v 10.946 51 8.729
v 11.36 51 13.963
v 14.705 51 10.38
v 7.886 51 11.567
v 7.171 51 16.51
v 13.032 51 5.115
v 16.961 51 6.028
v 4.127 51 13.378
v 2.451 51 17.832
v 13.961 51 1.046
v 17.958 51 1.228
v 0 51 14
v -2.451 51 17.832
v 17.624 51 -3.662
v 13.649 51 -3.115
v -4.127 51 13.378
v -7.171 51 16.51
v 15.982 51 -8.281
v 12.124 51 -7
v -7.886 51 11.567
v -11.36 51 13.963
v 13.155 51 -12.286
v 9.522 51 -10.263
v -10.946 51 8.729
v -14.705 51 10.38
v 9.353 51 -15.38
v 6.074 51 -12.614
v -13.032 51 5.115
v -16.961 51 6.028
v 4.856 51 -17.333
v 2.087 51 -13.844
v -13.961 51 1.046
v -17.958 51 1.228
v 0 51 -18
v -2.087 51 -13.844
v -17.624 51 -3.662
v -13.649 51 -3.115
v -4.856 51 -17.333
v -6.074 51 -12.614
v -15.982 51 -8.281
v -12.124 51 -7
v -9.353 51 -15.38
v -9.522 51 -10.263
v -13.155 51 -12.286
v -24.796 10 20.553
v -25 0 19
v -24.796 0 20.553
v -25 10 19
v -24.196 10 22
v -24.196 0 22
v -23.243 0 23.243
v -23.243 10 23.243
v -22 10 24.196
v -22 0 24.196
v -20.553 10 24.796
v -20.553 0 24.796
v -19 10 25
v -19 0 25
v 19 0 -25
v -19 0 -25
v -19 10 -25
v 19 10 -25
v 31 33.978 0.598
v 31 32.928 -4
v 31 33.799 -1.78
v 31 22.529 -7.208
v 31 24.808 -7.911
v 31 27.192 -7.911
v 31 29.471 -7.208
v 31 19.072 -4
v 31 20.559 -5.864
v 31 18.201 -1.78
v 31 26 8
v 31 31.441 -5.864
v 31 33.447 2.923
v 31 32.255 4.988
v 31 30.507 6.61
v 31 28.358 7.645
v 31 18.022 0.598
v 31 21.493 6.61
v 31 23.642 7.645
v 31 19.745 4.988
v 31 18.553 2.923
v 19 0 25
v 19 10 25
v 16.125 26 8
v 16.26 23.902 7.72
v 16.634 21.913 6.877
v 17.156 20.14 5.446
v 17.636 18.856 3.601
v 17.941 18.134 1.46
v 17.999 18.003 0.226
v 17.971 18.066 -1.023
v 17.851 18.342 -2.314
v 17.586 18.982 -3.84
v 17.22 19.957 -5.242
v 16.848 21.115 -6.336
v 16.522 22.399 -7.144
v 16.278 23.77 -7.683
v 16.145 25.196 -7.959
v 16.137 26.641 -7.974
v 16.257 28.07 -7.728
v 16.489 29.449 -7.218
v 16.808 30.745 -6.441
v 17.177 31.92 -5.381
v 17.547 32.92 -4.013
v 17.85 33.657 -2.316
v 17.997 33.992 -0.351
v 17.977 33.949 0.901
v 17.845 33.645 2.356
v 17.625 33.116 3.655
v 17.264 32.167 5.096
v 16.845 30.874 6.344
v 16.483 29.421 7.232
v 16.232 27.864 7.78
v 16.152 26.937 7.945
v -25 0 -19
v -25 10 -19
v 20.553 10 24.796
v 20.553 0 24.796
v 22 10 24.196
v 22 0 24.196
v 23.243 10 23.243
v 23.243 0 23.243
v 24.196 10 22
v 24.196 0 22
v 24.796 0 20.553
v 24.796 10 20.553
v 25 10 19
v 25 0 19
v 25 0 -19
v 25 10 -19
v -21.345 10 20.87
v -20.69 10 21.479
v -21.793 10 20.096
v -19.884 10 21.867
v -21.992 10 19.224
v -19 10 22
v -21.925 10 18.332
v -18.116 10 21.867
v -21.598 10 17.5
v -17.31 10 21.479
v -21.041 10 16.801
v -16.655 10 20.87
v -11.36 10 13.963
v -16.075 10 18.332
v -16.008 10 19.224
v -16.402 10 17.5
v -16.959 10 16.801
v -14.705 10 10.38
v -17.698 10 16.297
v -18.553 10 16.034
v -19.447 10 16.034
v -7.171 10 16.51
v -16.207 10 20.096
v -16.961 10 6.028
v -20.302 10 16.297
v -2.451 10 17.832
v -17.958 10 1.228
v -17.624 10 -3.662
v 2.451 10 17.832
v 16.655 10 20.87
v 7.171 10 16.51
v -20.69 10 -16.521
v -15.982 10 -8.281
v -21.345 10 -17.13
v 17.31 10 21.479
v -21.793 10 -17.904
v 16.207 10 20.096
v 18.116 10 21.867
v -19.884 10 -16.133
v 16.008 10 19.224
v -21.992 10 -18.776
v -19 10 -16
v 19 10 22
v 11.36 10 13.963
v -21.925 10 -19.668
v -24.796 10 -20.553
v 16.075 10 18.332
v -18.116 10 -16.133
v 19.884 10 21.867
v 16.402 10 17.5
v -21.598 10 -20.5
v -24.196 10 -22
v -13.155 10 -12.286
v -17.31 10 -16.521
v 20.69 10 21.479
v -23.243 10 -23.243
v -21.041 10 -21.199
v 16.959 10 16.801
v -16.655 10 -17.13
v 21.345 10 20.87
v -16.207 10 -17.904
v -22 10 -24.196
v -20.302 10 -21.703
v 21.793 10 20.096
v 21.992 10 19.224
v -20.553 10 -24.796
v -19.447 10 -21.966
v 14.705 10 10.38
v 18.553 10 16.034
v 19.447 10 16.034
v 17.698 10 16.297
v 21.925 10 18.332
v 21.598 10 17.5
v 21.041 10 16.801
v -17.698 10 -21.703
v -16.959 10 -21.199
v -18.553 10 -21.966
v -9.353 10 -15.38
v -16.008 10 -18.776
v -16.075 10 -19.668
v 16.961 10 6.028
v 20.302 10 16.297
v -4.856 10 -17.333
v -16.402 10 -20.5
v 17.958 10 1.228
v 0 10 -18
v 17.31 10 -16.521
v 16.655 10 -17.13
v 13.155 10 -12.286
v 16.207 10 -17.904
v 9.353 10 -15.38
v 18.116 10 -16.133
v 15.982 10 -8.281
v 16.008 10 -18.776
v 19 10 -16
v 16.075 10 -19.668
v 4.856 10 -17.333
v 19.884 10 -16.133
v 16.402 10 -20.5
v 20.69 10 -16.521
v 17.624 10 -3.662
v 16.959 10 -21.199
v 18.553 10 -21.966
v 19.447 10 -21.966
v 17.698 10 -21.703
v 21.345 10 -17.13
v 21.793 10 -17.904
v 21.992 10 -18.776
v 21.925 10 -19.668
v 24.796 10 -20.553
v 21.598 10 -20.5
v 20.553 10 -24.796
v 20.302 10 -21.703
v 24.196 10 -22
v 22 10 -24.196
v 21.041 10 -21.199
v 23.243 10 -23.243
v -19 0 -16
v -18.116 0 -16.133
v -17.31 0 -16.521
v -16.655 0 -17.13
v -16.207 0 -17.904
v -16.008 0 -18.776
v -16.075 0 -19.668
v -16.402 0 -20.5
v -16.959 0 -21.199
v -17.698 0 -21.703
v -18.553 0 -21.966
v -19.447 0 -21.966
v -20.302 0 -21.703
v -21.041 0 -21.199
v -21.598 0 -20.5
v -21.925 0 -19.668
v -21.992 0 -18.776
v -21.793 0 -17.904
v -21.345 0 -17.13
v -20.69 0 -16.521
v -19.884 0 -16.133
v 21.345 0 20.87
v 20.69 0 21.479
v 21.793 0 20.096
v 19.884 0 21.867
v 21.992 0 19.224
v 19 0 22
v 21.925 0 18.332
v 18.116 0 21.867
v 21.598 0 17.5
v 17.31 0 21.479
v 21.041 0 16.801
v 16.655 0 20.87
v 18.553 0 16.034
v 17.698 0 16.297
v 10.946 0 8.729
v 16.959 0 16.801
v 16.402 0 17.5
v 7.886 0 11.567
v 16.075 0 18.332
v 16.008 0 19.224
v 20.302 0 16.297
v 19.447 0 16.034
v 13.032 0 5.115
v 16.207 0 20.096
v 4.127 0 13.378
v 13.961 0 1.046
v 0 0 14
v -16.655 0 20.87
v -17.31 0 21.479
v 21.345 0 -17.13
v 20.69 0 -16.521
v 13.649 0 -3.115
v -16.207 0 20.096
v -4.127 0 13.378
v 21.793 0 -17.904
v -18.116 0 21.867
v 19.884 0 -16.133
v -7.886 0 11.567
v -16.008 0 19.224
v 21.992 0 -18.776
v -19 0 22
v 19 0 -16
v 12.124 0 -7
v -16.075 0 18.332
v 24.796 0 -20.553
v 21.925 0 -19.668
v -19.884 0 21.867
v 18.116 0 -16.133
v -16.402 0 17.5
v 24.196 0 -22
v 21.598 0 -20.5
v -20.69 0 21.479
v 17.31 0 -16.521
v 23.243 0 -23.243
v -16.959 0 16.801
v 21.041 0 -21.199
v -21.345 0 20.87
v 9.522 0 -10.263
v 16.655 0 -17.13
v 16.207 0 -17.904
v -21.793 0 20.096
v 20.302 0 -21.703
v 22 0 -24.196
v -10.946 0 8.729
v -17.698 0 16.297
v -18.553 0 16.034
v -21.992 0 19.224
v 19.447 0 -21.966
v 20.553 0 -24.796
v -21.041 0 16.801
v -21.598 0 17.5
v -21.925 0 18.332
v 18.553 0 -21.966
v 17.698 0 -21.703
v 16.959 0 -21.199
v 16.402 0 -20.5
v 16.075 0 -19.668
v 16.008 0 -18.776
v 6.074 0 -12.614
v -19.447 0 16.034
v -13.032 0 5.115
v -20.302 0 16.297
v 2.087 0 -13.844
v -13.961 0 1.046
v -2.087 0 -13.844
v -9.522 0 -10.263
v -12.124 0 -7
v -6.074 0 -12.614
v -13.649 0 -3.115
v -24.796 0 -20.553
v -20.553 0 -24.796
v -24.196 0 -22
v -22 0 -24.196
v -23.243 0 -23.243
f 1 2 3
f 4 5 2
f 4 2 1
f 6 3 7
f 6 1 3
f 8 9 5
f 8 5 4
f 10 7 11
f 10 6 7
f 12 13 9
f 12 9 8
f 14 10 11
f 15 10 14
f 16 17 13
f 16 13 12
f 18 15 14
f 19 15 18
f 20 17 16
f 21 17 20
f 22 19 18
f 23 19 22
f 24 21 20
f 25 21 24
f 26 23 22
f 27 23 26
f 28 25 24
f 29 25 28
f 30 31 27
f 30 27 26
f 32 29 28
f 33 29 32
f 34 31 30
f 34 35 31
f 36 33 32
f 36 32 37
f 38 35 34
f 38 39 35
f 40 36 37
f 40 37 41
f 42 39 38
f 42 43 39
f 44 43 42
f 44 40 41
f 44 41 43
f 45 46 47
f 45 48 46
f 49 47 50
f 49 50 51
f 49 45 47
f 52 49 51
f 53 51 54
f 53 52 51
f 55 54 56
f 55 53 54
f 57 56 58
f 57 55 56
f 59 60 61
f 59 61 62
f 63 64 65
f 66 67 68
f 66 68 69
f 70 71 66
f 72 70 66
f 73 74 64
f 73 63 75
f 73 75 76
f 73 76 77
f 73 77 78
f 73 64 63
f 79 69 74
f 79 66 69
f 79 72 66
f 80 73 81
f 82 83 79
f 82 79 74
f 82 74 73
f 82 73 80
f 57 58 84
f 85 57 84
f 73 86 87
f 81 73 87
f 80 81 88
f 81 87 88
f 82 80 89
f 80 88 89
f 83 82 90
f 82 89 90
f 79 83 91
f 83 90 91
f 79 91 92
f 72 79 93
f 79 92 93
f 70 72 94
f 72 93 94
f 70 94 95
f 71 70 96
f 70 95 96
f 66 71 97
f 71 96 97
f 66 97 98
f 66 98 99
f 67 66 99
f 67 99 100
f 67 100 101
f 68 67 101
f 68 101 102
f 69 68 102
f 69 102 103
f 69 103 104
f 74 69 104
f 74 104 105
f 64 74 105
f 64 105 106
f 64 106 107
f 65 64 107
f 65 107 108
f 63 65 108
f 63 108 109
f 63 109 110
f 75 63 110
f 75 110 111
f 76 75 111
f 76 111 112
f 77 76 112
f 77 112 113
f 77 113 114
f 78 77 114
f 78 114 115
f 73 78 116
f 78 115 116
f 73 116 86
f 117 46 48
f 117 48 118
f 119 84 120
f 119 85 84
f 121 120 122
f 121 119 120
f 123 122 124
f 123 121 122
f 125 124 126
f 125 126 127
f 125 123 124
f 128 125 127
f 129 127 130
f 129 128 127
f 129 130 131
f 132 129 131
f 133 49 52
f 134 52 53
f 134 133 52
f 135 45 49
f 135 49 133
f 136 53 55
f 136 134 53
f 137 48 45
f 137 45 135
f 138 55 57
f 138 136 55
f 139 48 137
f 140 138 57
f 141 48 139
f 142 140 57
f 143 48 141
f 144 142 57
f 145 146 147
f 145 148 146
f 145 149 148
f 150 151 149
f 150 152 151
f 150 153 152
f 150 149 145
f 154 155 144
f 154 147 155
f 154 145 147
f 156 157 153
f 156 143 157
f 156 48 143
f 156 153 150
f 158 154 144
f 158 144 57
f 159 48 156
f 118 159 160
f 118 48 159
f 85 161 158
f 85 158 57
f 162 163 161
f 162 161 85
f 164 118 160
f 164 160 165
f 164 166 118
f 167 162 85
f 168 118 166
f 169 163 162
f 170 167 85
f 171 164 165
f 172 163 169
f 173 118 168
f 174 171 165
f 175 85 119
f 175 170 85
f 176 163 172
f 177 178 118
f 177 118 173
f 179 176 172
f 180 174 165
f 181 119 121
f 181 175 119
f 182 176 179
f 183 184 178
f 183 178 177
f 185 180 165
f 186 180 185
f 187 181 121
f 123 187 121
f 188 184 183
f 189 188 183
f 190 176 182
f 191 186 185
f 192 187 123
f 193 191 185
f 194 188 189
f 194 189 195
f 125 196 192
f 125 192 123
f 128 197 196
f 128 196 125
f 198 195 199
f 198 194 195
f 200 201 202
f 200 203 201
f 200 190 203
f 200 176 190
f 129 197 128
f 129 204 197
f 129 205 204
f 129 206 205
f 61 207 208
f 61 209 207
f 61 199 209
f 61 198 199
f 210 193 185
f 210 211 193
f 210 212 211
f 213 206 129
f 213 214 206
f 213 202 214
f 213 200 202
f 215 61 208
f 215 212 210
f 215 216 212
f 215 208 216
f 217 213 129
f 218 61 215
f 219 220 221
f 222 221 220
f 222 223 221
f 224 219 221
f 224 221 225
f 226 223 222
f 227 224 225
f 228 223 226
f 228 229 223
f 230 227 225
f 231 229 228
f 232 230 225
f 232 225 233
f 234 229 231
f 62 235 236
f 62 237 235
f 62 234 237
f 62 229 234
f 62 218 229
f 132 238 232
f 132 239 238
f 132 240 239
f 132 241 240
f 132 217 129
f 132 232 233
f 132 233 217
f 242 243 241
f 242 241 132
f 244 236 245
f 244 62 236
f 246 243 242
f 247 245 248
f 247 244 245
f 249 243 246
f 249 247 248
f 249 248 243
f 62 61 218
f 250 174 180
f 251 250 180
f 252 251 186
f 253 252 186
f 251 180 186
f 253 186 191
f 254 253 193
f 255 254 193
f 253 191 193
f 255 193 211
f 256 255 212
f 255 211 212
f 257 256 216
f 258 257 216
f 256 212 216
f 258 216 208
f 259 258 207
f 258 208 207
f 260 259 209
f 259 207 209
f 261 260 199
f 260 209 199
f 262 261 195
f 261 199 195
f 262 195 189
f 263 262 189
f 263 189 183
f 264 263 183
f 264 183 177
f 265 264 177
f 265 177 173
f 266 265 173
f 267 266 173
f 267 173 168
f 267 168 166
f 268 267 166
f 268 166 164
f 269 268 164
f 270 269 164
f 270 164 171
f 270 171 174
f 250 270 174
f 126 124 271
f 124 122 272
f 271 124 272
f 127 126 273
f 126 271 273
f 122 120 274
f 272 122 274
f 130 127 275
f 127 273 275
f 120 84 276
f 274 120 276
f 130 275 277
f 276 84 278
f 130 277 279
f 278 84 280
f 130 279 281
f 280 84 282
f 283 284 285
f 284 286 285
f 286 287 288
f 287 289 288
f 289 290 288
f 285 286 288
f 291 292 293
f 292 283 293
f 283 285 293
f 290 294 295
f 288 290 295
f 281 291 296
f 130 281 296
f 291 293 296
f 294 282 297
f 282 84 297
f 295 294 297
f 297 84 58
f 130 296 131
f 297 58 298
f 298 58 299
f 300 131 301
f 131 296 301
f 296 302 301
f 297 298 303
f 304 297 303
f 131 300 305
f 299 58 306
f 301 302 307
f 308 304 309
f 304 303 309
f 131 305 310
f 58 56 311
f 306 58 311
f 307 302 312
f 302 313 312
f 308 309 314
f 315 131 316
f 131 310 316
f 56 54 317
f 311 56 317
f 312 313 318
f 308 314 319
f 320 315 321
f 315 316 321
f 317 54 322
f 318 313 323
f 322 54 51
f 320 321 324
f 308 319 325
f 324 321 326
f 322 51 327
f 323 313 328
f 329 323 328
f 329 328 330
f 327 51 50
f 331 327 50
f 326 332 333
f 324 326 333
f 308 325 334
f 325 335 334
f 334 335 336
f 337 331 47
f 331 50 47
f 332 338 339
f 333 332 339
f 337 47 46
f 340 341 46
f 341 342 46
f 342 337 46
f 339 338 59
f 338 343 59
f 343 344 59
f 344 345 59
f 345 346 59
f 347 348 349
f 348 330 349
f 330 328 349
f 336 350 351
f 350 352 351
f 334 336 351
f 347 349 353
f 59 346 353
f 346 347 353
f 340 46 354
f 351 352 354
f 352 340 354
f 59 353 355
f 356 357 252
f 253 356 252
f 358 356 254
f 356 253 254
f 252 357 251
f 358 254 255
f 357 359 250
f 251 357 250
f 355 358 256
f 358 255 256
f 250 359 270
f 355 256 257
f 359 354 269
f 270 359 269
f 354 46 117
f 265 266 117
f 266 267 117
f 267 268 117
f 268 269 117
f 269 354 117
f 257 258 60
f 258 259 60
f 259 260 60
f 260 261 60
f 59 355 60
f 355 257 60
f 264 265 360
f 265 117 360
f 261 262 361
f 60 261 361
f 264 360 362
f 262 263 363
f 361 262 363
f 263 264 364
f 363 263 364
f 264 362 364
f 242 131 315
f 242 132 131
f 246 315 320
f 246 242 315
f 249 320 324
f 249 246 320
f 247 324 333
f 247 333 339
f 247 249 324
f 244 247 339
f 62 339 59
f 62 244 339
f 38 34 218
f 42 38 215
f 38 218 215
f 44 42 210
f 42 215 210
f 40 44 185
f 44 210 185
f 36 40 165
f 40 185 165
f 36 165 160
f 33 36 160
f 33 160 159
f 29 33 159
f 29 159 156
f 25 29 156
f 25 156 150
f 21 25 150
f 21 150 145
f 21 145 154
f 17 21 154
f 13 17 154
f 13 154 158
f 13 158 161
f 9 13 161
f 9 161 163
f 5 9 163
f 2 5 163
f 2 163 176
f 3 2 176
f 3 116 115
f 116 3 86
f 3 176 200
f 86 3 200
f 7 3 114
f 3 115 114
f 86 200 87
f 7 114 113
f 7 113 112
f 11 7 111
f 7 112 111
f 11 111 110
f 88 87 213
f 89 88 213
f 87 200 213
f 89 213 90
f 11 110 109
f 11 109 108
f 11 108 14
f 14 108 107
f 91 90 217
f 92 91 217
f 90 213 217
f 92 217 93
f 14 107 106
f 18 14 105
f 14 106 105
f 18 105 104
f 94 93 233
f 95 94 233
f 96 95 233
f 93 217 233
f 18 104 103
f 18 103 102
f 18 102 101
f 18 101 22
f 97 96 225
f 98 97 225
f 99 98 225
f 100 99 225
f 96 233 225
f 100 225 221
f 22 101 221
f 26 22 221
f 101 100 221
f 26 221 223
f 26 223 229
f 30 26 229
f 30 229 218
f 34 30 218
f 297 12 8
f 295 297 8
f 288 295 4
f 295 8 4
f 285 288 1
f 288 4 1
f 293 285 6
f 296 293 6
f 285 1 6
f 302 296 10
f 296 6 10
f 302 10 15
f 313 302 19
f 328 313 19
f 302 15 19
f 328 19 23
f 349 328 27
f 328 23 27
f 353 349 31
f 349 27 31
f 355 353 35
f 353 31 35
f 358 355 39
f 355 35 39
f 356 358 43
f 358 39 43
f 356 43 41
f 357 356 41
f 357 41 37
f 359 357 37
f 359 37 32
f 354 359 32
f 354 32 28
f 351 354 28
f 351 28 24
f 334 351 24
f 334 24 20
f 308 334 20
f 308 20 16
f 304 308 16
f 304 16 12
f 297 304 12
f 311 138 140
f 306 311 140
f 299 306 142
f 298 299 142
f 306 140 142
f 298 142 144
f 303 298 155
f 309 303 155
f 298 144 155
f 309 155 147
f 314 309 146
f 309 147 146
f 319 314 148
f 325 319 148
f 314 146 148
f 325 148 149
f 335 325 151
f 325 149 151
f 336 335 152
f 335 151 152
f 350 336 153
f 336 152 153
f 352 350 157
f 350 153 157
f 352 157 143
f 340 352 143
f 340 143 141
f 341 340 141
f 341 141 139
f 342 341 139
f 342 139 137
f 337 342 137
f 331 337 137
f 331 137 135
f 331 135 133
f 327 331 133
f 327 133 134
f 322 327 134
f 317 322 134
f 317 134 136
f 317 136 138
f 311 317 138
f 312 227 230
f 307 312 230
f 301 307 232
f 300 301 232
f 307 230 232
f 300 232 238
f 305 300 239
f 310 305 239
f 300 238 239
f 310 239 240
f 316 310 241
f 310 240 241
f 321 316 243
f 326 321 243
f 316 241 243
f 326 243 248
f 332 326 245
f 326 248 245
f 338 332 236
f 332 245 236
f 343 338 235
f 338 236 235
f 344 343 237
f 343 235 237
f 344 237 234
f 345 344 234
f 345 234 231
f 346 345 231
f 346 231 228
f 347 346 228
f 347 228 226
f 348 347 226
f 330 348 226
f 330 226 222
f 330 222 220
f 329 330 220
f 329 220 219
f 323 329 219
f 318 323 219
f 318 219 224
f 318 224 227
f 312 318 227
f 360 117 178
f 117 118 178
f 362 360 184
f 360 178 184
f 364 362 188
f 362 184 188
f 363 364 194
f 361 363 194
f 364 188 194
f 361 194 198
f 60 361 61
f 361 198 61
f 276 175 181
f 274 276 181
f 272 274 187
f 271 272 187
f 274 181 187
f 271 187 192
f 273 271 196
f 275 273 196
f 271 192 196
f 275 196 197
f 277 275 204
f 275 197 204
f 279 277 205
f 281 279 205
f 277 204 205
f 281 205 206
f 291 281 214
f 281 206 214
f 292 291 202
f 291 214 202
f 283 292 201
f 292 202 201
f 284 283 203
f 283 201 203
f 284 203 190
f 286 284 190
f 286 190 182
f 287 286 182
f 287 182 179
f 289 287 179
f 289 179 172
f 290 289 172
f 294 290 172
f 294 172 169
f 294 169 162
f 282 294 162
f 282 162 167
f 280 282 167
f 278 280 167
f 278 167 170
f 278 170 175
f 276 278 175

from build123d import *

# Parameters (mm, degrees)
SKETCH_3_W           = 50
SKETCH_3_H           = 50
EXTRUDE_1_DEPTH      = 10
FILLET_7_R           = 6
FILLET_8_R           = 6
FILLET_9_R           = 6
FILLET_10_R          = 6
SKETCH_4_R           = 3
CUT_EXTRUDE_1_DEPTH  = 37.742346142
SKETCH_6_R           = 3
CUT_EXTRUDE_14_DEPTH = 37.742346142
SKETCH_7_R           = 3
CUT_EXTRUDE_15_DEPTH = 37.742346142
SKETCH_8_R           = 3
CUT_EXTRUDE_16_DEPTH = 37.742346142
SKETCH_9_R           = 18
EXTRUDE_4_DEPTH      = 51
SKETCH_12_R          = 8
EXTRUDE_5_DEPTH      = 31
SKETCH_10_R          = 14
CUT_EXTRUDE_17_DEPTH = 65.707032123


with BuildPart() as part:
    # 草图3 → 凸台-拉伸1 (new body)
    with BuildSketch(Plane(origin=(0, 0, 0), x_dir=(1, 0, 0), z_dir=(0, 1, 0))):
        Rectangle(SKETCH_3_W, SKETCH_3_H)
    extrude(amount=EXTRUDE_1_DEPTH)

    # 圆角7
    fillet_7_edges = [part.edges().sort_by_distance(p)[0] for p in [
        (-25, 5, -25),
    ]]
    fillet(fillet_7_edges, radius=FILLET_7_R)

    # 圆角8
    fillet_8_edges = [part.edges().sort_by_distance(p)[0] for p in [
        (-25, 5, 25),
    ]]
    fillet(fillet_8_edges, radius=FILLET_8_R)

    # 圆角9
    fillet_9_edges = [part.edges().sort_by_distance(p)[0] for p in [
        (25, 5, 25),
    ]]
    fillet(fillet_9_edges, radius=FILLET_9_R)

    # 圆角10
    fillet_10_edges = [part.edges().sort_by_distance(p)[0] for p in [
        (25, 5, -25),
    ]]
    fillet(fillet_10_edges, radius=FILLET_10_R)

    # 草图4 → 切除-拉伸1 (cut, through all)
    with BuildSketch(Plane(origin=(0, 10, 0), x_dir=(1, 0, 0), z_dir=(0, 1, 0))):
        with Locations(Location((-19, -19, 0), (0, 0, 270))):
            Circle(SKETCH_4_R)
    extrude(amount=-CUT_EXTRUDE_1_DEPTH, mode=Mode.SUBTRACT)

    # 草图6 → 切除-拉伸14 (cut, through all)
    with BuildSketch(Plane(origin=(0, 10, 0), x_dir=(1, 0, 0), z_dir=(0, 1, 0))):
        with Locations(Location((-19, 19, 0), (0, 0, 270))):
            Circle(SKETCH_6_R)
    extrude(amount=-CUT_EXTRUDE_14_DEPTH, mode=Mode.SUBTRACT)

    # 草图7 → 切除-拉伸15 (cut, through all)
    with BuildSketch(Plane(origin=(0, 10, 0), x_dir=(1, 0, 0), z_dir=(0, 1, 0))):
        with Locations(Location((19, 19, 0), (0, 0, 270))):
            Circle(SKETCH_7_R)
    extrude(amount=-CUT_EXTRUDE_15_DEPTH, mode=Mode.SUBTRACT)

    # 草图8 → 切除-拉伸16 (cut, through all)
    with BuildSketch(Plane(origin=(0, 10, 0), x_dir=(1, 0, 0), z_dir=(0, 1, 0))):
        with Locations(Location((19, -19, 0), (0, 0, 270))):
            Circle(SKETCH_8_R)
    extrude(amount=-CUT_EXTRUDE_16_DEPTH, mode=Mode.SUBTRACT)

    # 草图9 → 凸台-拉伸4 (add)
    with BuildSketch(Plane(origin=(0, 0, 0), x_dir=(1, 0, 0), z_dir=(0, 1, 0))):
        with Locations(Location((0, 0, 0), (0, 0, 90))):
            Circle(SKETCH_9_R)
    extrude(amount=EXTRUDE_4_DEPTH)

    # 草图12 → 凸台-拉伸5 (add)
    with BuildSketch(Plane(origin=(0, 0, 0), x_dir=(0, 0, -1), z_dir=(1, 0, 0))):
        with Locations(Location((0, 26, 0), (0, 0, 180))):
            Circle(SKETCH_12_R)
    extrude(amount=EXTRUDE_5_DEPTH)

    # 草图10 → 切除-拉伸17 (cut, through all)
    with BuildSketch(Plane(origin=(0, 51, 0), x_dir=(1, 0, 0), z_dir=(0, 1, 0))):
        with Locations(Location((0, 0, 0), (0, 0, 270))):
            Circle(SKETCH_10_R)
    extrude(amount=-CUT_EXTRUDE_17_DEPTH, mode=Mode.SUBTRACT)


solid = part.part
